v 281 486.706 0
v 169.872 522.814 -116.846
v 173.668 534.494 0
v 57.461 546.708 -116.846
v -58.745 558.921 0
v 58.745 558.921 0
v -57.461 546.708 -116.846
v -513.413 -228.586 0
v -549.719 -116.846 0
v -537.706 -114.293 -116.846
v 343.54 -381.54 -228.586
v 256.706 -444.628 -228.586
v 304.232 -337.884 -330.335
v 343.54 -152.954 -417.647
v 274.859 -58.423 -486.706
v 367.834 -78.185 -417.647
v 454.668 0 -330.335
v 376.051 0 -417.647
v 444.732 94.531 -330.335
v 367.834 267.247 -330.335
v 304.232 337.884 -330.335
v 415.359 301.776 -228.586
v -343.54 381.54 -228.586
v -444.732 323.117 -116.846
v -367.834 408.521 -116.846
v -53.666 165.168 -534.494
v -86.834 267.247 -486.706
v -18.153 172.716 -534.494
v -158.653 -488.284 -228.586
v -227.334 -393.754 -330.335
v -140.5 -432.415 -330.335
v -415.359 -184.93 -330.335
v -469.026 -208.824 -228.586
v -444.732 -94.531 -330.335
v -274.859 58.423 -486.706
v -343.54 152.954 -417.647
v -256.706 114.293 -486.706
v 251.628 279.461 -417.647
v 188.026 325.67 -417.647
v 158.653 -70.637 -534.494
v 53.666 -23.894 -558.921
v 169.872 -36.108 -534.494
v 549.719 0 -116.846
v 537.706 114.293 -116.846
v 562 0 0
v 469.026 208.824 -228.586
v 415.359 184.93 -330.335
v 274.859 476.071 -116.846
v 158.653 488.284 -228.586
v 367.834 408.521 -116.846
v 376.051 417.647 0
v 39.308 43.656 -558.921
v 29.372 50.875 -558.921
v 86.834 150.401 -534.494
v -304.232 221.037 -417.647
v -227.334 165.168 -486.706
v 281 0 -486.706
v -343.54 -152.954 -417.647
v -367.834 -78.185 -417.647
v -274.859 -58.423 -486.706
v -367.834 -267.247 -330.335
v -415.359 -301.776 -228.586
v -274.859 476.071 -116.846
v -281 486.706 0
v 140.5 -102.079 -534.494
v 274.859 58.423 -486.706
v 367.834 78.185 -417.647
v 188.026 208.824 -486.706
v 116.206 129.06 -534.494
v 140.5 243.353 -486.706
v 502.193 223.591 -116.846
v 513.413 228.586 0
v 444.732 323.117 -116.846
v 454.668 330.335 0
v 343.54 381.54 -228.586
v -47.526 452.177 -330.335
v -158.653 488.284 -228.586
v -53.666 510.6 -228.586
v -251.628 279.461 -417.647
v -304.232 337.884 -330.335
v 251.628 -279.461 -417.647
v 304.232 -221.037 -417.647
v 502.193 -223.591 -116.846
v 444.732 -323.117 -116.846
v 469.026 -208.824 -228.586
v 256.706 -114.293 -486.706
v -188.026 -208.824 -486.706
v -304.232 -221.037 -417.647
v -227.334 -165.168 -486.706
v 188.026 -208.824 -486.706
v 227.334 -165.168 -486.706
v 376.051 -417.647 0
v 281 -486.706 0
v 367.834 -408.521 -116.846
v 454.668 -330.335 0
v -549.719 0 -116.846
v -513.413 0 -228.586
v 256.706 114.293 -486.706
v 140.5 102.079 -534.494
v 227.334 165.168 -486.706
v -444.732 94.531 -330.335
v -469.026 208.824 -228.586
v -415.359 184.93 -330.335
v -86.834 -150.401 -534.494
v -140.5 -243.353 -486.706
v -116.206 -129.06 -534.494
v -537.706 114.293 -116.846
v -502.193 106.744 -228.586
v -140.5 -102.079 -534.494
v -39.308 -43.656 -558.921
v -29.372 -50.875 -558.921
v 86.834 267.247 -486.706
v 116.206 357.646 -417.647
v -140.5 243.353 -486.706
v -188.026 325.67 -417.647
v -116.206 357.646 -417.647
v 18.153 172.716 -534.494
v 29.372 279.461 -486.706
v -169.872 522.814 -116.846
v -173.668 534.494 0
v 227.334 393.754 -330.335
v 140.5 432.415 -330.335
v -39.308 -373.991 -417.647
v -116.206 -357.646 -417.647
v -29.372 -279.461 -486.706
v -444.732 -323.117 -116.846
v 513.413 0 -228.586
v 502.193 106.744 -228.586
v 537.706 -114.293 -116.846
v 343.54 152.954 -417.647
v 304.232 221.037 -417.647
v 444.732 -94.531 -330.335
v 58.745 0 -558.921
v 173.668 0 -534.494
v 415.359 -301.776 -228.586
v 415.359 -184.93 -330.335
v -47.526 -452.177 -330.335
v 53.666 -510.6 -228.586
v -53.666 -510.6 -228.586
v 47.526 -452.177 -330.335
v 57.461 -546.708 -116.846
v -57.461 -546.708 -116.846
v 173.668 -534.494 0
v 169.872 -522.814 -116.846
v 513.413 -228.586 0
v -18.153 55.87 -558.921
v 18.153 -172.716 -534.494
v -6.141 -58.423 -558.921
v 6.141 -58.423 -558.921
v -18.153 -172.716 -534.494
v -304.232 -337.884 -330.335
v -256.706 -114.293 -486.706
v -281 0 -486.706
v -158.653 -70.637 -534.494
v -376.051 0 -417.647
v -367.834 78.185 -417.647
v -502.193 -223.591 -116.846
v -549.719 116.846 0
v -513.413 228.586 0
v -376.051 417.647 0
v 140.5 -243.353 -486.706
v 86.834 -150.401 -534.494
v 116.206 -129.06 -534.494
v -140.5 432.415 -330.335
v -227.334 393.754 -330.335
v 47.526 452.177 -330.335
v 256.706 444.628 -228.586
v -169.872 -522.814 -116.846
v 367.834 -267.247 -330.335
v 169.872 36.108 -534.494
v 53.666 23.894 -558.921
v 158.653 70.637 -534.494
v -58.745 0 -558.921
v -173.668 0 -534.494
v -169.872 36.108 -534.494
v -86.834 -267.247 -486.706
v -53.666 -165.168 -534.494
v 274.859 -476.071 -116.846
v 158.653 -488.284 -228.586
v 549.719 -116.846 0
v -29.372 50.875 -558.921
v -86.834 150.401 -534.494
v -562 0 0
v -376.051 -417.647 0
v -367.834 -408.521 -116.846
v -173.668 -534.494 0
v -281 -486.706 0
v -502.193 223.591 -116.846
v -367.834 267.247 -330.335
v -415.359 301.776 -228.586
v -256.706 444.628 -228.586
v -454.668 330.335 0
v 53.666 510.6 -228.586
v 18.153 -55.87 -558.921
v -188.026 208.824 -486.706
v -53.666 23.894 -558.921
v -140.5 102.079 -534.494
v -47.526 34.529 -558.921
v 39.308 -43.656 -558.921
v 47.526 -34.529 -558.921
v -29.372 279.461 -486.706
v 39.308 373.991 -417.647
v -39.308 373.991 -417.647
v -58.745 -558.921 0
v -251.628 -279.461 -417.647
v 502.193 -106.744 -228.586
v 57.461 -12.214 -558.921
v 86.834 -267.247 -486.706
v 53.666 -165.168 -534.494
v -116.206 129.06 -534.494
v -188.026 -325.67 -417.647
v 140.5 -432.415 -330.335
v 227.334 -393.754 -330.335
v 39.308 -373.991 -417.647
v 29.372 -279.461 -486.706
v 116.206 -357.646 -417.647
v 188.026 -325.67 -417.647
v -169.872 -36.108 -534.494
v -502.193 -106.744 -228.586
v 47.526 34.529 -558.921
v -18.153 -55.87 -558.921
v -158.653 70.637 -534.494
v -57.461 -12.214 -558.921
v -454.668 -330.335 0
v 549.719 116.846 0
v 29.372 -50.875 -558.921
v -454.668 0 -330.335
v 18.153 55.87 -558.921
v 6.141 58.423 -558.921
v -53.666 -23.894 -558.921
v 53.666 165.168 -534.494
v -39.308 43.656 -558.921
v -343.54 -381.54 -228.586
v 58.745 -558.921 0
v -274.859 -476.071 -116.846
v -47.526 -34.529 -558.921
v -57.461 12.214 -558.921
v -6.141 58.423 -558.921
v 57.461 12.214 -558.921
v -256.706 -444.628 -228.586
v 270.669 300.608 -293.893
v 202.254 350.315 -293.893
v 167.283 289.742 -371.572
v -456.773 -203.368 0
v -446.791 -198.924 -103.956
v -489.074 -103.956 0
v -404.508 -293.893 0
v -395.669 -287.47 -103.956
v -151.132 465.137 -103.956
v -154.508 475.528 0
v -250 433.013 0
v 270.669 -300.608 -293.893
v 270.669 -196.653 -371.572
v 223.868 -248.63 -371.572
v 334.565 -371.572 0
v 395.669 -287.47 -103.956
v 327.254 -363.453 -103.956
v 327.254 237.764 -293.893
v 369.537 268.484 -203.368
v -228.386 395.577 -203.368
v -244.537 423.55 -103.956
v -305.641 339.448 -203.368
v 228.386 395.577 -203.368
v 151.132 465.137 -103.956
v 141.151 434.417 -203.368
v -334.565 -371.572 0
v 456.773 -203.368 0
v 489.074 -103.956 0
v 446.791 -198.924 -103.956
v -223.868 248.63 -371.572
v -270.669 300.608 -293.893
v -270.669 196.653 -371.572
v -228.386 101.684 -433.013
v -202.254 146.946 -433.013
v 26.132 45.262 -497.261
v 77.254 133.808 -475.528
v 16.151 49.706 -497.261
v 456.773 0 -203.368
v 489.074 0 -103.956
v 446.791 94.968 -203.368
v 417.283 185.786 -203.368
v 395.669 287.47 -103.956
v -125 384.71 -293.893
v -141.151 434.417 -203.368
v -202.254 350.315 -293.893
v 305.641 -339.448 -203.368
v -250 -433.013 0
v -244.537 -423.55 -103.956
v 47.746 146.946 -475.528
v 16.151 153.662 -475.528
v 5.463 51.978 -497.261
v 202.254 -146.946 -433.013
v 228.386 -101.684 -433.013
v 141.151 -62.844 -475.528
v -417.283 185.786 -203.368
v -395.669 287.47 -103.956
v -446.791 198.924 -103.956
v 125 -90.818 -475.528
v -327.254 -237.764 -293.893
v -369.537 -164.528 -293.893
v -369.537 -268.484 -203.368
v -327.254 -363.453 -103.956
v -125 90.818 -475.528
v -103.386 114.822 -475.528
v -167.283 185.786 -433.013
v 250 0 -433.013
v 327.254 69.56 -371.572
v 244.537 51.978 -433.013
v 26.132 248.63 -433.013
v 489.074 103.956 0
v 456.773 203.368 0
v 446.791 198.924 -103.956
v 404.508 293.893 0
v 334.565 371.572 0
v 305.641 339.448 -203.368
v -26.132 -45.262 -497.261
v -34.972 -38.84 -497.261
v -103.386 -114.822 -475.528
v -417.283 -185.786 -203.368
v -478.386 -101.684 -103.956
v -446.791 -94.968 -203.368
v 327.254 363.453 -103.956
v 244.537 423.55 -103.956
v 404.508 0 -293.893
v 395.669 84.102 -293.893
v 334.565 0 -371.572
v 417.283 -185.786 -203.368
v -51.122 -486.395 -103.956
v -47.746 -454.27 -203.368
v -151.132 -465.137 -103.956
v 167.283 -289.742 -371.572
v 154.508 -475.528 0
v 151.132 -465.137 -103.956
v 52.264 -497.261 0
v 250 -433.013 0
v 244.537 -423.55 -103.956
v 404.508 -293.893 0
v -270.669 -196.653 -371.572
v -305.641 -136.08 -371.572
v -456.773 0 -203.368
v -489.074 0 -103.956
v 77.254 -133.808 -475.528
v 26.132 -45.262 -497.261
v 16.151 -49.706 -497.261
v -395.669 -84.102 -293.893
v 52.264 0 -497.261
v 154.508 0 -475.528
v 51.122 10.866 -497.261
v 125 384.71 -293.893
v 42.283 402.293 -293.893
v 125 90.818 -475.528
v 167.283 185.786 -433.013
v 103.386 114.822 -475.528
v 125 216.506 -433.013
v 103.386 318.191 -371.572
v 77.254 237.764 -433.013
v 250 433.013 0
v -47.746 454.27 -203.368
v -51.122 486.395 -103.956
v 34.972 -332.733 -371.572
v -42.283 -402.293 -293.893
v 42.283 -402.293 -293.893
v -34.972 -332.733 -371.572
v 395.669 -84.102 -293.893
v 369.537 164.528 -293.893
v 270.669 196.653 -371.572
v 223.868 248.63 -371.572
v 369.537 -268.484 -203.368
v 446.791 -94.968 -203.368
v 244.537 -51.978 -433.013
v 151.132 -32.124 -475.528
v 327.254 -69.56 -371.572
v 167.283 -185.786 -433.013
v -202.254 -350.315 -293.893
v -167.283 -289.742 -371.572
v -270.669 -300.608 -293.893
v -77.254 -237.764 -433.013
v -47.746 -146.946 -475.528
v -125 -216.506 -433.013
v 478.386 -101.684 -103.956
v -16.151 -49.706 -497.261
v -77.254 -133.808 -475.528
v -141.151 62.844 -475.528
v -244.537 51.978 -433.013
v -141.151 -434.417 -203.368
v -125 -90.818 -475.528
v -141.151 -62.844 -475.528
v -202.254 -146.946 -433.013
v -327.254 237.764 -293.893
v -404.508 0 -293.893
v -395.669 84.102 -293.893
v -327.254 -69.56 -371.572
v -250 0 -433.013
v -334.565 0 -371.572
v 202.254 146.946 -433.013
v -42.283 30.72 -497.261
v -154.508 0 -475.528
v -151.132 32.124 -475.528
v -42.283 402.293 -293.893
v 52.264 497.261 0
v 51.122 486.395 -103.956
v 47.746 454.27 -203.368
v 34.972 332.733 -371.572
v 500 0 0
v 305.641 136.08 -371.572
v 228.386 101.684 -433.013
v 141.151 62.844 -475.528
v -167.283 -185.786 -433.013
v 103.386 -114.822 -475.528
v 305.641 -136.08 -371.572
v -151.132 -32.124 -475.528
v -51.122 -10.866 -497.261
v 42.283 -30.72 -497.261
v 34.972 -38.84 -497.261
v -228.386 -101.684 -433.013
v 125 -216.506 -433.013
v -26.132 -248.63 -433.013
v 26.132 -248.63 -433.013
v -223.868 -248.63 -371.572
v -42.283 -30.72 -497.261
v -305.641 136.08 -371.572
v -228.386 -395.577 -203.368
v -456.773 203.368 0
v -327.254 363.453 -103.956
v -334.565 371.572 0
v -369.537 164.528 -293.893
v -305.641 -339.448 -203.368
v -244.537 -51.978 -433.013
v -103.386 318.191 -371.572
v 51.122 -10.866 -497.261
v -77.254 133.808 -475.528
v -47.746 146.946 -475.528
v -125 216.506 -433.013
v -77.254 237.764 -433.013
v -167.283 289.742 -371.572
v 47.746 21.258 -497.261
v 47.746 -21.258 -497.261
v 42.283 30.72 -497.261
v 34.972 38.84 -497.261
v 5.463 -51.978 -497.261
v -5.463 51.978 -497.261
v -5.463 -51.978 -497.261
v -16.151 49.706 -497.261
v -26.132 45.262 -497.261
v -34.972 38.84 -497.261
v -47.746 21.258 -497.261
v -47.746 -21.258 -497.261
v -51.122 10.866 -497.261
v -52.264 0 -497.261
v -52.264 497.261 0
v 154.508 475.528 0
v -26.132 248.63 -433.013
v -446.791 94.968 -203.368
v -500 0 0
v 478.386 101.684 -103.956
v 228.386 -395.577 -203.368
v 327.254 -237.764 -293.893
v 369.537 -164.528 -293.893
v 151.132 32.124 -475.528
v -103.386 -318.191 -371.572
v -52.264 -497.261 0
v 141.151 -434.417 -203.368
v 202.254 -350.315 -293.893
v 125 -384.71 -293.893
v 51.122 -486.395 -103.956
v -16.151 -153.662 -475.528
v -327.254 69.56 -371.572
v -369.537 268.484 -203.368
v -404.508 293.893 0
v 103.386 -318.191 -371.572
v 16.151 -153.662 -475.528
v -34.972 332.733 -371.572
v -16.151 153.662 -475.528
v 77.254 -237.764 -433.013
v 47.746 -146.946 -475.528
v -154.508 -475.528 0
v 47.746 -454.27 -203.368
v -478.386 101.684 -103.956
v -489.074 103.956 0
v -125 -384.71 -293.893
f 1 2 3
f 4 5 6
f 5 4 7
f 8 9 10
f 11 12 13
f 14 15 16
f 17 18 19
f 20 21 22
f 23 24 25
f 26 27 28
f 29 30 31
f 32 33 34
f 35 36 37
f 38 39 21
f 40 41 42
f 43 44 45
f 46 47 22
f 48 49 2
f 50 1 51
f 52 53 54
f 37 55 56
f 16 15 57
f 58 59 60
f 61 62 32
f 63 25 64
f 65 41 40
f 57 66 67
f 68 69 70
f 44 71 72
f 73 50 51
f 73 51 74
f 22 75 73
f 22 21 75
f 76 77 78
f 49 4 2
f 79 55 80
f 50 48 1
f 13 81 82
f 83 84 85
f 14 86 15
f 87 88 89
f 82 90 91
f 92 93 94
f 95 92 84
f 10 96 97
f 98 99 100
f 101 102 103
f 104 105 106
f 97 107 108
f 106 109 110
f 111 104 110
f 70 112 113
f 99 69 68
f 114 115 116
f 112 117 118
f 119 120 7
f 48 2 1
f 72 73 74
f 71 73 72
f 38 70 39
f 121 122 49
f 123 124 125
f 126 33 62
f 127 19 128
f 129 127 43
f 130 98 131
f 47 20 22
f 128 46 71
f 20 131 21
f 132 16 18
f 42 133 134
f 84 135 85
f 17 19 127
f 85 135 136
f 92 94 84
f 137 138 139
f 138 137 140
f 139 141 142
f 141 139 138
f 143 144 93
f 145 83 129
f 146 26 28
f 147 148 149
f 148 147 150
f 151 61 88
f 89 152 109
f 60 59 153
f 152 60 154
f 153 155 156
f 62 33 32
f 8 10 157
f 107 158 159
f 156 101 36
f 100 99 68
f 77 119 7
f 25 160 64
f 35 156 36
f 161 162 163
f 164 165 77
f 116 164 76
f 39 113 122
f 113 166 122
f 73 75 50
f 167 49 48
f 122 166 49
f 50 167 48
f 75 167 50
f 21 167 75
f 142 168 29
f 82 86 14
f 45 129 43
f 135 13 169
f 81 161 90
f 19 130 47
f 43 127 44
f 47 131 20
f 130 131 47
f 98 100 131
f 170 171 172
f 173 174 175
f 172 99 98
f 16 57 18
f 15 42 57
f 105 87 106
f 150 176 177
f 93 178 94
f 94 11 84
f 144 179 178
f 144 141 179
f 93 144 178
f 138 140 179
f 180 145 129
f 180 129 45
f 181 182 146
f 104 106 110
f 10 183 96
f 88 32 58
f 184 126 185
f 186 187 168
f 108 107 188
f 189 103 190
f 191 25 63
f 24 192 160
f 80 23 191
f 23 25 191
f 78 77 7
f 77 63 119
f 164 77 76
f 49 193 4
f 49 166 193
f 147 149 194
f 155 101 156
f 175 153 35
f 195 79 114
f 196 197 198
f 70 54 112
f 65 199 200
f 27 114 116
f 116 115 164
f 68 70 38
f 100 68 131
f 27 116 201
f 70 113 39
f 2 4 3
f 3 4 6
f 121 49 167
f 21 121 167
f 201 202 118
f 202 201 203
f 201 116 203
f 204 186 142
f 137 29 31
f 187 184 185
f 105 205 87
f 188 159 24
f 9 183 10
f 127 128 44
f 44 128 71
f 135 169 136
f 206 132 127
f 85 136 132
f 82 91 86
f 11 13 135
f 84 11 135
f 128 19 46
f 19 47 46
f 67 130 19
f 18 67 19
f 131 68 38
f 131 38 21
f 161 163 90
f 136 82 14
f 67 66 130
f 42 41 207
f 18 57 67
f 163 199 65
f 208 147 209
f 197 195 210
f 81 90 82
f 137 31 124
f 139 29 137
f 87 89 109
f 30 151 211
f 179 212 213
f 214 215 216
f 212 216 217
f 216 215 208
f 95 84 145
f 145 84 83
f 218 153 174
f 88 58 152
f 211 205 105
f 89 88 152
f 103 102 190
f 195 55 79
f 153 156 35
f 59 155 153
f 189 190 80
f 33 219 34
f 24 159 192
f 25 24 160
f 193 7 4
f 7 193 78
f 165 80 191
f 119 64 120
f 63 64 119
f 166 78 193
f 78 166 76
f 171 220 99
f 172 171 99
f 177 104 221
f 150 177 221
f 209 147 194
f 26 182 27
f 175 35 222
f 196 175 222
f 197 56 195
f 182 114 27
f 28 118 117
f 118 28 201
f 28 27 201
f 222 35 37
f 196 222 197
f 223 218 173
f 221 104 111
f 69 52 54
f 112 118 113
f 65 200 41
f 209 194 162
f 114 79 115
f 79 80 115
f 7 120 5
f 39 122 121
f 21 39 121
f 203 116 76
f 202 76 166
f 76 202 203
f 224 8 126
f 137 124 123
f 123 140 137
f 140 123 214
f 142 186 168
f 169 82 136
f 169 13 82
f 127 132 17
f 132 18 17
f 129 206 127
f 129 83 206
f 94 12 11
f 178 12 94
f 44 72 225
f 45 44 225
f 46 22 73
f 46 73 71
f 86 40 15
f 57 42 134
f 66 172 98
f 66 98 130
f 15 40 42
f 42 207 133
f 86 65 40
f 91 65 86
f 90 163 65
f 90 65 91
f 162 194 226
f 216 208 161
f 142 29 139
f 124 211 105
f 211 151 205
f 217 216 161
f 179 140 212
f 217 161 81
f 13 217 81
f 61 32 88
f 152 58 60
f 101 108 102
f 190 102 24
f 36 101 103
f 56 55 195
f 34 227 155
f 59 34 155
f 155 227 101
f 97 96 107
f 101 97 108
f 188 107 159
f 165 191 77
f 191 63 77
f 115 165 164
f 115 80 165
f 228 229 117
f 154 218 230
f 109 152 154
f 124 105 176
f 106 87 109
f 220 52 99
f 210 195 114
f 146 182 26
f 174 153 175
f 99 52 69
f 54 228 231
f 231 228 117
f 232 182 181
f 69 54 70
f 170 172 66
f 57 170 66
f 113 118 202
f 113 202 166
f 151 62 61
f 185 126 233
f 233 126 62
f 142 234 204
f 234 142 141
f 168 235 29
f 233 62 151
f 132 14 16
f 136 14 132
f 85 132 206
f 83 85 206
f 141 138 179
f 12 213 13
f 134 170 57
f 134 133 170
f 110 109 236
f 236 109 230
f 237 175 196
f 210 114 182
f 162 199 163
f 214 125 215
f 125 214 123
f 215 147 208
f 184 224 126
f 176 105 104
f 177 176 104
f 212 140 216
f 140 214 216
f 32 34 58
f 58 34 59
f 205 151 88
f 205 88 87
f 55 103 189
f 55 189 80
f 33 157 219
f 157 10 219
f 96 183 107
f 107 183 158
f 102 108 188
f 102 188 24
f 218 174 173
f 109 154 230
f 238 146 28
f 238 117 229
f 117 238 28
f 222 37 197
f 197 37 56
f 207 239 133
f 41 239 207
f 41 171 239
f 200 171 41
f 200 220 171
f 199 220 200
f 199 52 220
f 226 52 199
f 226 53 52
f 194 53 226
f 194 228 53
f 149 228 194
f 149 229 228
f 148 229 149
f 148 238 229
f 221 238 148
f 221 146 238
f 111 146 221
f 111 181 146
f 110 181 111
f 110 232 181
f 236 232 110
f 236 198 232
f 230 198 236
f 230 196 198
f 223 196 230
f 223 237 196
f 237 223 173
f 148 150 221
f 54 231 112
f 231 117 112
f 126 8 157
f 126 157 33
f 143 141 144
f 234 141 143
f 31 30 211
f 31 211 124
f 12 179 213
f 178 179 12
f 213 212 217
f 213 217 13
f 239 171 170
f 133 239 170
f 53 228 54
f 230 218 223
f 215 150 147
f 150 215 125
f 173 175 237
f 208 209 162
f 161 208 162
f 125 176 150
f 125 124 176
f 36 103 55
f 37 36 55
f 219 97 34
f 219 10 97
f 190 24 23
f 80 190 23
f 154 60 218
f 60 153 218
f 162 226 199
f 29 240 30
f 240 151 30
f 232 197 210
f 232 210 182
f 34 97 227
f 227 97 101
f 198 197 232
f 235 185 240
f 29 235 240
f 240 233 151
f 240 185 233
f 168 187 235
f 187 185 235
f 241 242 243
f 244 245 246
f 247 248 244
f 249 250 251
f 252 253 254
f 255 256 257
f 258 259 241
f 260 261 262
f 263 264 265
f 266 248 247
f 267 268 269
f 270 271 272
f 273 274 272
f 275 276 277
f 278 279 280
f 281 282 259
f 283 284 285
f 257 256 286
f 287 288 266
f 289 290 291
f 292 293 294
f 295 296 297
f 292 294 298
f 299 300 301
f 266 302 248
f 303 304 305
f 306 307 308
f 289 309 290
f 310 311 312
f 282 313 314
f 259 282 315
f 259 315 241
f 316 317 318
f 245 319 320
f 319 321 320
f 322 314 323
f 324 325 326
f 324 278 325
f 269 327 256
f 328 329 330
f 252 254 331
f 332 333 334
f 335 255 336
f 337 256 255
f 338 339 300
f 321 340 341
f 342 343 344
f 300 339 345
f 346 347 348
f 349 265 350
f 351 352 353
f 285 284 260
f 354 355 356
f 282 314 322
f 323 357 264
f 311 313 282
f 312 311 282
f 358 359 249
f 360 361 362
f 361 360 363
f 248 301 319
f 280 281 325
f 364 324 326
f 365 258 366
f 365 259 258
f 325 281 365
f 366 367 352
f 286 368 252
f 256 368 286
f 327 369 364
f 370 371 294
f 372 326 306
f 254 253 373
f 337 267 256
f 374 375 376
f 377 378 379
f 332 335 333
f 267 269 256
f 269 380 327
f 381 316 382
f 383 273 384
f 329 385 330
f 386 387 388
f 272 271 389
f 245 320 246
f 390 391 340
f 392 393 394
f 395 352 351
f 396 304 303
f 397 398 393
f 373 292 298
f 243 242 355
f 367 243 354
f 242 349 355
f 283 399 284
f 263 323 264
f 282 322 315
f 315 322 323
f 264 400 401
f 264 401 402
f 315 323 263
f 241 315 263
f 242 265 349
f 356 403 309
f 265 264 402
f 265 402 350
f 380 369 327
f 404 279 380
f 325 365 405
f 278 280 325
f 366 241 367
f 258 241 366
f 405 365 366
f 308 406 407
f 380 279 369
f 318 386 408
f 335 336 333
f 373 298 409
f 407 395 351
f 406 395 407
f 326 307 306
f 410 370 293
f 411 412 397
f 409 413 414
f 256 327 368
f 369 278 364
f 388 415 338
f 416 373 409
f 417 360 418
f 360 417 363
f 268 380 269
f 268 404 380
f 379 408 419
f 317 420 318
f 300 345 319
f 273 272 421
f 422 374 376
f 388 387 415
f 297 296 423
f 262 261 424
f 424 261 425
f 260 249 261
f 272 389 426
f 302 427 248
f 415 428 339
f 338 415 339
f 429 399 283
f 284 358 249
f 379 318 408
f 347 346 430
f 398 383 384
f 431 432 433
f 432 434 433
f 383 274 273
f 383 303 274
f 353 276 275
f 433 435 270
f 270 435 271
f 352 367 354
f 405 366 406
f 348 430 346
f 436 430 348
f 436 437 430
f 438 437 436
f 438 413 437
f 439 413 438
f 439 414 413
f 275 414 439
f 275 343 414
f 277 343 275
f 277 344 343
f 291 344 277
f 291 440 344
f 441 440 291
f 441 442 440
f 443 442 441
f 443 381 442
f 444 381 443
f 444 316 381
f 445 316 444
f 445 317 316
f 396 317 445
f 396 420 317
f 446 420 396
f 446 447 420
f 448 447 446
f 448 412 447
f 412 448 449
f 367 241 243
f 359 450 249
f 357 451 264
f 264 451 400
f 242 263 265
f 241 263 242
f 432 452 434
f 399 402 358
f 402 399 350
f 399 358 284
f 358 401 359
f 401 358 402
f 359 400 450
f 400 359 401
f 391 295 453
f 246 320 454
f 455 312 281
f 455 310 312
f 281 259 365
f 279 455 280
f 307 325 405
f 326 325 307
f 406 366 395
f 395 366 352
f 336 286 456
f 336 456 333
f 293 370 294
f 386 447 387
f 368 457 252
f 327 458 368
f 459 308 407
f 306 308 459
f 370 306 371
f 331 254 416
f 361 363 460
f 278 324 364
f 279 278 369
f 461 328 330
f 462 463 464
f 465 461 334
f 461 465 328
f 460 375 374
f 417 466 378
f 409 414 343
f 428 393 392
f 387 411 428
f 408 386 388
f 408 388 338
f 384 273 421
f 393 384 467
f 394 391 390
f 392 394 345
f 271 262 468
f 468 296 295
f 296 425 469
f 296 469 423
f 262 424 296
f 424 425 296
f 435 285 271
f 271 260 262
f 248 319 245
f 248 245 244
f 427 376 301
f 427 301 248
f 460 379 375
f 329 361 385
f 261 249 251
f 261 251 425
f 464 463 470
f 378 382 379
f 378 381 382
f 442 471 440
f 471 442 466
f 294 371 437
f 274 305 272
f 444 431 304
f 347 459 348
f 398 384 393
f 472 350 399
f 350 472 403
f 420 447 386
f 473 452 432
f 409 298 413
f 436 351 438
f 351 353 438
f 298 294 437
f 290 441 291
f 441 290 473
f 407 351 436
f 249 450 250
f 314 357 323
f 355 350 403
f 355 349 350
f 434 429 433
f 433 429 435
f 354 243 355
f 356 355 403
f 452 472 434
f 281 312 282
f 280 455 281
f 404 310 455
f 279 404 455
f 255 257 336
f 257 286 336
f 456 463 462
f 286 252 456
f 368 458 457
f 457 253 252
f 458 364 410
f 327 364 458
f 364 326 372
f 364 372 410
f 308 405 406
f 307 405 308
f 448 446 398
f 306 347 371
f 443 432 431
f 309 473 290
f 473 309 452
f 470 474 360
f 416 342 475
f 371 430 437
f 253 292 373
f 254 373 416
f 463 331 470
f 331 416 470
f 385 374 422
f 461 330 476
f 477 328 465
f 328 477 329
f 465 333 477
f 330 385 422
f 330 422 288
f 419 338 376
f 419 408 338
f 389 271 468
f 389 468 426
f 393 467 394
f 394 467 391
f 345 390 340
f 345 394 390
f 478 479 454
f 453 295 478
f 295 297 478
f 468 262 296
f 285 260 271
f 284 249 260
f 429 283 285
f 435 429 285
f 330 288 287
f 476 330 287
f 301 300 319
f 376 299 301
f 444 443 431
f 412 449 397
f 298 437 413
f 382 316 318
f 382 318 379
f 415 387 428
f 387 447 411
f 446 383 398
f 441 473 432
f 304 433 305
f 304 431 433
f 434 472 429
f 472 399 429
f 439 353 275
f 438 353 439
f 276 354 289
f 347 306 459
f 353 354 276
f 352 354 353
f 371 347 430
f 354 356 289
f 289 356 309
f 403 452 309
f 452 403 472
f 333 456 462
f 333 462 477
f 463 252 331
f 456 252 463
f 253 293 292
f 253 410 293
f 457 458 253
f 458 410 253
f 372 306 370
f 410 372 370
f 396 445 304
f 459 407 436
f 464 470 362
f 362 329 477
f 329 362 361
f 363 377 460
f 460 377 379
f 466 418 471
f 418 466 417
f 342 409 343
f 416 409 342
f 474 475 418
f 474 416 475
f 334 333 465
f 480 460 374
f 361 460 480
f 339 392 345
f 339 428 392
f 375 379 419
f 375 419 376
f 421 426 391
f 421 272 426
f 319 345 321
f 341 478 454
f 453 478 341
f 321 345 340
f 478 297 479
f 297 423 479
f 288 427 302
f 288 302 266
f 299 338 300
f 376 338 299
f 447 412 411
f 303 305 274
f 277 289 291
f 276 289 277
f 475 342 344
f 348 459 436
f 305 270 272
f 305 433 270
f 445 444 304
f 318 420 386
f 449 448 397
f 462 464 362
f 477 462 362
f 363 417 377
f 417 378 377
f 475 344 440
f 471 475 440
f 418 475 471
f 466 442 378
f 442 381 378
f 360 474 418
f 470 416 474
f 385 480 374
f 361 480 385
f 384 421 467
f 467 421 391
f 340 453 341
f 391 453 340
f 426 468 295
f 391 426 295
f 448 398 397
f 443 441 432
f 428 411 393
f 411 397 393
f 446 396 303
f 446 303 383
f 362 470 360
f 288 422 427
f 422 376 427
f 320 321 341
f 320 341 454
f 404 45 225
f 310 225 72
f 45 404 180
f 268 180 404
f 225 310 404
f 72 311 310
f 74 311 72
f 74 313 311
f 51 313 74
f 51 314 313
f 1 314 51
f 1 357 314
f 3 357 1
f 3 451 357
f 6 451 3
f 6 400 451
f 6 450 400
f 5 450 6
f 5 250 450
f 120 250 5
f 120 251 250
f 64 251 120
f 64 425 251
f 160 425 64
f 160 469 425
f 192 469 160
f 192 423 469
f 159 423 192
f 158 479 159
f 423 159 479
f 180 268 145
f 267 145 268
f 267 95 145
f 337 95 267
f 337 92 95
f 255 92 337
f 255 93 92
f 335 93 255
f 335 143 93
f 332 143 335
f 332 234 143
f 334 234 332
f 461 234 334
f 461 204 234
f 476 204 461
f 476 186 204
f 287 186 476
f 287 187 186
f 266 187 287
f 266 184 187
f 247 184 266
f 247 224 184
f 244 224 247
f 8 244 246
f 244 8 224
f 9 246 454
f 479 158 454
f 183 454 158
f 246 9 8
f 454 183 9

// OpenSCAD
module hemisphere(r, t) {
	difference() {
		sphere(r);
	}
}

difference() {
	sphere(562);
	sphere(500);
	translate([-600,-600,0]) cube(1200);
}
